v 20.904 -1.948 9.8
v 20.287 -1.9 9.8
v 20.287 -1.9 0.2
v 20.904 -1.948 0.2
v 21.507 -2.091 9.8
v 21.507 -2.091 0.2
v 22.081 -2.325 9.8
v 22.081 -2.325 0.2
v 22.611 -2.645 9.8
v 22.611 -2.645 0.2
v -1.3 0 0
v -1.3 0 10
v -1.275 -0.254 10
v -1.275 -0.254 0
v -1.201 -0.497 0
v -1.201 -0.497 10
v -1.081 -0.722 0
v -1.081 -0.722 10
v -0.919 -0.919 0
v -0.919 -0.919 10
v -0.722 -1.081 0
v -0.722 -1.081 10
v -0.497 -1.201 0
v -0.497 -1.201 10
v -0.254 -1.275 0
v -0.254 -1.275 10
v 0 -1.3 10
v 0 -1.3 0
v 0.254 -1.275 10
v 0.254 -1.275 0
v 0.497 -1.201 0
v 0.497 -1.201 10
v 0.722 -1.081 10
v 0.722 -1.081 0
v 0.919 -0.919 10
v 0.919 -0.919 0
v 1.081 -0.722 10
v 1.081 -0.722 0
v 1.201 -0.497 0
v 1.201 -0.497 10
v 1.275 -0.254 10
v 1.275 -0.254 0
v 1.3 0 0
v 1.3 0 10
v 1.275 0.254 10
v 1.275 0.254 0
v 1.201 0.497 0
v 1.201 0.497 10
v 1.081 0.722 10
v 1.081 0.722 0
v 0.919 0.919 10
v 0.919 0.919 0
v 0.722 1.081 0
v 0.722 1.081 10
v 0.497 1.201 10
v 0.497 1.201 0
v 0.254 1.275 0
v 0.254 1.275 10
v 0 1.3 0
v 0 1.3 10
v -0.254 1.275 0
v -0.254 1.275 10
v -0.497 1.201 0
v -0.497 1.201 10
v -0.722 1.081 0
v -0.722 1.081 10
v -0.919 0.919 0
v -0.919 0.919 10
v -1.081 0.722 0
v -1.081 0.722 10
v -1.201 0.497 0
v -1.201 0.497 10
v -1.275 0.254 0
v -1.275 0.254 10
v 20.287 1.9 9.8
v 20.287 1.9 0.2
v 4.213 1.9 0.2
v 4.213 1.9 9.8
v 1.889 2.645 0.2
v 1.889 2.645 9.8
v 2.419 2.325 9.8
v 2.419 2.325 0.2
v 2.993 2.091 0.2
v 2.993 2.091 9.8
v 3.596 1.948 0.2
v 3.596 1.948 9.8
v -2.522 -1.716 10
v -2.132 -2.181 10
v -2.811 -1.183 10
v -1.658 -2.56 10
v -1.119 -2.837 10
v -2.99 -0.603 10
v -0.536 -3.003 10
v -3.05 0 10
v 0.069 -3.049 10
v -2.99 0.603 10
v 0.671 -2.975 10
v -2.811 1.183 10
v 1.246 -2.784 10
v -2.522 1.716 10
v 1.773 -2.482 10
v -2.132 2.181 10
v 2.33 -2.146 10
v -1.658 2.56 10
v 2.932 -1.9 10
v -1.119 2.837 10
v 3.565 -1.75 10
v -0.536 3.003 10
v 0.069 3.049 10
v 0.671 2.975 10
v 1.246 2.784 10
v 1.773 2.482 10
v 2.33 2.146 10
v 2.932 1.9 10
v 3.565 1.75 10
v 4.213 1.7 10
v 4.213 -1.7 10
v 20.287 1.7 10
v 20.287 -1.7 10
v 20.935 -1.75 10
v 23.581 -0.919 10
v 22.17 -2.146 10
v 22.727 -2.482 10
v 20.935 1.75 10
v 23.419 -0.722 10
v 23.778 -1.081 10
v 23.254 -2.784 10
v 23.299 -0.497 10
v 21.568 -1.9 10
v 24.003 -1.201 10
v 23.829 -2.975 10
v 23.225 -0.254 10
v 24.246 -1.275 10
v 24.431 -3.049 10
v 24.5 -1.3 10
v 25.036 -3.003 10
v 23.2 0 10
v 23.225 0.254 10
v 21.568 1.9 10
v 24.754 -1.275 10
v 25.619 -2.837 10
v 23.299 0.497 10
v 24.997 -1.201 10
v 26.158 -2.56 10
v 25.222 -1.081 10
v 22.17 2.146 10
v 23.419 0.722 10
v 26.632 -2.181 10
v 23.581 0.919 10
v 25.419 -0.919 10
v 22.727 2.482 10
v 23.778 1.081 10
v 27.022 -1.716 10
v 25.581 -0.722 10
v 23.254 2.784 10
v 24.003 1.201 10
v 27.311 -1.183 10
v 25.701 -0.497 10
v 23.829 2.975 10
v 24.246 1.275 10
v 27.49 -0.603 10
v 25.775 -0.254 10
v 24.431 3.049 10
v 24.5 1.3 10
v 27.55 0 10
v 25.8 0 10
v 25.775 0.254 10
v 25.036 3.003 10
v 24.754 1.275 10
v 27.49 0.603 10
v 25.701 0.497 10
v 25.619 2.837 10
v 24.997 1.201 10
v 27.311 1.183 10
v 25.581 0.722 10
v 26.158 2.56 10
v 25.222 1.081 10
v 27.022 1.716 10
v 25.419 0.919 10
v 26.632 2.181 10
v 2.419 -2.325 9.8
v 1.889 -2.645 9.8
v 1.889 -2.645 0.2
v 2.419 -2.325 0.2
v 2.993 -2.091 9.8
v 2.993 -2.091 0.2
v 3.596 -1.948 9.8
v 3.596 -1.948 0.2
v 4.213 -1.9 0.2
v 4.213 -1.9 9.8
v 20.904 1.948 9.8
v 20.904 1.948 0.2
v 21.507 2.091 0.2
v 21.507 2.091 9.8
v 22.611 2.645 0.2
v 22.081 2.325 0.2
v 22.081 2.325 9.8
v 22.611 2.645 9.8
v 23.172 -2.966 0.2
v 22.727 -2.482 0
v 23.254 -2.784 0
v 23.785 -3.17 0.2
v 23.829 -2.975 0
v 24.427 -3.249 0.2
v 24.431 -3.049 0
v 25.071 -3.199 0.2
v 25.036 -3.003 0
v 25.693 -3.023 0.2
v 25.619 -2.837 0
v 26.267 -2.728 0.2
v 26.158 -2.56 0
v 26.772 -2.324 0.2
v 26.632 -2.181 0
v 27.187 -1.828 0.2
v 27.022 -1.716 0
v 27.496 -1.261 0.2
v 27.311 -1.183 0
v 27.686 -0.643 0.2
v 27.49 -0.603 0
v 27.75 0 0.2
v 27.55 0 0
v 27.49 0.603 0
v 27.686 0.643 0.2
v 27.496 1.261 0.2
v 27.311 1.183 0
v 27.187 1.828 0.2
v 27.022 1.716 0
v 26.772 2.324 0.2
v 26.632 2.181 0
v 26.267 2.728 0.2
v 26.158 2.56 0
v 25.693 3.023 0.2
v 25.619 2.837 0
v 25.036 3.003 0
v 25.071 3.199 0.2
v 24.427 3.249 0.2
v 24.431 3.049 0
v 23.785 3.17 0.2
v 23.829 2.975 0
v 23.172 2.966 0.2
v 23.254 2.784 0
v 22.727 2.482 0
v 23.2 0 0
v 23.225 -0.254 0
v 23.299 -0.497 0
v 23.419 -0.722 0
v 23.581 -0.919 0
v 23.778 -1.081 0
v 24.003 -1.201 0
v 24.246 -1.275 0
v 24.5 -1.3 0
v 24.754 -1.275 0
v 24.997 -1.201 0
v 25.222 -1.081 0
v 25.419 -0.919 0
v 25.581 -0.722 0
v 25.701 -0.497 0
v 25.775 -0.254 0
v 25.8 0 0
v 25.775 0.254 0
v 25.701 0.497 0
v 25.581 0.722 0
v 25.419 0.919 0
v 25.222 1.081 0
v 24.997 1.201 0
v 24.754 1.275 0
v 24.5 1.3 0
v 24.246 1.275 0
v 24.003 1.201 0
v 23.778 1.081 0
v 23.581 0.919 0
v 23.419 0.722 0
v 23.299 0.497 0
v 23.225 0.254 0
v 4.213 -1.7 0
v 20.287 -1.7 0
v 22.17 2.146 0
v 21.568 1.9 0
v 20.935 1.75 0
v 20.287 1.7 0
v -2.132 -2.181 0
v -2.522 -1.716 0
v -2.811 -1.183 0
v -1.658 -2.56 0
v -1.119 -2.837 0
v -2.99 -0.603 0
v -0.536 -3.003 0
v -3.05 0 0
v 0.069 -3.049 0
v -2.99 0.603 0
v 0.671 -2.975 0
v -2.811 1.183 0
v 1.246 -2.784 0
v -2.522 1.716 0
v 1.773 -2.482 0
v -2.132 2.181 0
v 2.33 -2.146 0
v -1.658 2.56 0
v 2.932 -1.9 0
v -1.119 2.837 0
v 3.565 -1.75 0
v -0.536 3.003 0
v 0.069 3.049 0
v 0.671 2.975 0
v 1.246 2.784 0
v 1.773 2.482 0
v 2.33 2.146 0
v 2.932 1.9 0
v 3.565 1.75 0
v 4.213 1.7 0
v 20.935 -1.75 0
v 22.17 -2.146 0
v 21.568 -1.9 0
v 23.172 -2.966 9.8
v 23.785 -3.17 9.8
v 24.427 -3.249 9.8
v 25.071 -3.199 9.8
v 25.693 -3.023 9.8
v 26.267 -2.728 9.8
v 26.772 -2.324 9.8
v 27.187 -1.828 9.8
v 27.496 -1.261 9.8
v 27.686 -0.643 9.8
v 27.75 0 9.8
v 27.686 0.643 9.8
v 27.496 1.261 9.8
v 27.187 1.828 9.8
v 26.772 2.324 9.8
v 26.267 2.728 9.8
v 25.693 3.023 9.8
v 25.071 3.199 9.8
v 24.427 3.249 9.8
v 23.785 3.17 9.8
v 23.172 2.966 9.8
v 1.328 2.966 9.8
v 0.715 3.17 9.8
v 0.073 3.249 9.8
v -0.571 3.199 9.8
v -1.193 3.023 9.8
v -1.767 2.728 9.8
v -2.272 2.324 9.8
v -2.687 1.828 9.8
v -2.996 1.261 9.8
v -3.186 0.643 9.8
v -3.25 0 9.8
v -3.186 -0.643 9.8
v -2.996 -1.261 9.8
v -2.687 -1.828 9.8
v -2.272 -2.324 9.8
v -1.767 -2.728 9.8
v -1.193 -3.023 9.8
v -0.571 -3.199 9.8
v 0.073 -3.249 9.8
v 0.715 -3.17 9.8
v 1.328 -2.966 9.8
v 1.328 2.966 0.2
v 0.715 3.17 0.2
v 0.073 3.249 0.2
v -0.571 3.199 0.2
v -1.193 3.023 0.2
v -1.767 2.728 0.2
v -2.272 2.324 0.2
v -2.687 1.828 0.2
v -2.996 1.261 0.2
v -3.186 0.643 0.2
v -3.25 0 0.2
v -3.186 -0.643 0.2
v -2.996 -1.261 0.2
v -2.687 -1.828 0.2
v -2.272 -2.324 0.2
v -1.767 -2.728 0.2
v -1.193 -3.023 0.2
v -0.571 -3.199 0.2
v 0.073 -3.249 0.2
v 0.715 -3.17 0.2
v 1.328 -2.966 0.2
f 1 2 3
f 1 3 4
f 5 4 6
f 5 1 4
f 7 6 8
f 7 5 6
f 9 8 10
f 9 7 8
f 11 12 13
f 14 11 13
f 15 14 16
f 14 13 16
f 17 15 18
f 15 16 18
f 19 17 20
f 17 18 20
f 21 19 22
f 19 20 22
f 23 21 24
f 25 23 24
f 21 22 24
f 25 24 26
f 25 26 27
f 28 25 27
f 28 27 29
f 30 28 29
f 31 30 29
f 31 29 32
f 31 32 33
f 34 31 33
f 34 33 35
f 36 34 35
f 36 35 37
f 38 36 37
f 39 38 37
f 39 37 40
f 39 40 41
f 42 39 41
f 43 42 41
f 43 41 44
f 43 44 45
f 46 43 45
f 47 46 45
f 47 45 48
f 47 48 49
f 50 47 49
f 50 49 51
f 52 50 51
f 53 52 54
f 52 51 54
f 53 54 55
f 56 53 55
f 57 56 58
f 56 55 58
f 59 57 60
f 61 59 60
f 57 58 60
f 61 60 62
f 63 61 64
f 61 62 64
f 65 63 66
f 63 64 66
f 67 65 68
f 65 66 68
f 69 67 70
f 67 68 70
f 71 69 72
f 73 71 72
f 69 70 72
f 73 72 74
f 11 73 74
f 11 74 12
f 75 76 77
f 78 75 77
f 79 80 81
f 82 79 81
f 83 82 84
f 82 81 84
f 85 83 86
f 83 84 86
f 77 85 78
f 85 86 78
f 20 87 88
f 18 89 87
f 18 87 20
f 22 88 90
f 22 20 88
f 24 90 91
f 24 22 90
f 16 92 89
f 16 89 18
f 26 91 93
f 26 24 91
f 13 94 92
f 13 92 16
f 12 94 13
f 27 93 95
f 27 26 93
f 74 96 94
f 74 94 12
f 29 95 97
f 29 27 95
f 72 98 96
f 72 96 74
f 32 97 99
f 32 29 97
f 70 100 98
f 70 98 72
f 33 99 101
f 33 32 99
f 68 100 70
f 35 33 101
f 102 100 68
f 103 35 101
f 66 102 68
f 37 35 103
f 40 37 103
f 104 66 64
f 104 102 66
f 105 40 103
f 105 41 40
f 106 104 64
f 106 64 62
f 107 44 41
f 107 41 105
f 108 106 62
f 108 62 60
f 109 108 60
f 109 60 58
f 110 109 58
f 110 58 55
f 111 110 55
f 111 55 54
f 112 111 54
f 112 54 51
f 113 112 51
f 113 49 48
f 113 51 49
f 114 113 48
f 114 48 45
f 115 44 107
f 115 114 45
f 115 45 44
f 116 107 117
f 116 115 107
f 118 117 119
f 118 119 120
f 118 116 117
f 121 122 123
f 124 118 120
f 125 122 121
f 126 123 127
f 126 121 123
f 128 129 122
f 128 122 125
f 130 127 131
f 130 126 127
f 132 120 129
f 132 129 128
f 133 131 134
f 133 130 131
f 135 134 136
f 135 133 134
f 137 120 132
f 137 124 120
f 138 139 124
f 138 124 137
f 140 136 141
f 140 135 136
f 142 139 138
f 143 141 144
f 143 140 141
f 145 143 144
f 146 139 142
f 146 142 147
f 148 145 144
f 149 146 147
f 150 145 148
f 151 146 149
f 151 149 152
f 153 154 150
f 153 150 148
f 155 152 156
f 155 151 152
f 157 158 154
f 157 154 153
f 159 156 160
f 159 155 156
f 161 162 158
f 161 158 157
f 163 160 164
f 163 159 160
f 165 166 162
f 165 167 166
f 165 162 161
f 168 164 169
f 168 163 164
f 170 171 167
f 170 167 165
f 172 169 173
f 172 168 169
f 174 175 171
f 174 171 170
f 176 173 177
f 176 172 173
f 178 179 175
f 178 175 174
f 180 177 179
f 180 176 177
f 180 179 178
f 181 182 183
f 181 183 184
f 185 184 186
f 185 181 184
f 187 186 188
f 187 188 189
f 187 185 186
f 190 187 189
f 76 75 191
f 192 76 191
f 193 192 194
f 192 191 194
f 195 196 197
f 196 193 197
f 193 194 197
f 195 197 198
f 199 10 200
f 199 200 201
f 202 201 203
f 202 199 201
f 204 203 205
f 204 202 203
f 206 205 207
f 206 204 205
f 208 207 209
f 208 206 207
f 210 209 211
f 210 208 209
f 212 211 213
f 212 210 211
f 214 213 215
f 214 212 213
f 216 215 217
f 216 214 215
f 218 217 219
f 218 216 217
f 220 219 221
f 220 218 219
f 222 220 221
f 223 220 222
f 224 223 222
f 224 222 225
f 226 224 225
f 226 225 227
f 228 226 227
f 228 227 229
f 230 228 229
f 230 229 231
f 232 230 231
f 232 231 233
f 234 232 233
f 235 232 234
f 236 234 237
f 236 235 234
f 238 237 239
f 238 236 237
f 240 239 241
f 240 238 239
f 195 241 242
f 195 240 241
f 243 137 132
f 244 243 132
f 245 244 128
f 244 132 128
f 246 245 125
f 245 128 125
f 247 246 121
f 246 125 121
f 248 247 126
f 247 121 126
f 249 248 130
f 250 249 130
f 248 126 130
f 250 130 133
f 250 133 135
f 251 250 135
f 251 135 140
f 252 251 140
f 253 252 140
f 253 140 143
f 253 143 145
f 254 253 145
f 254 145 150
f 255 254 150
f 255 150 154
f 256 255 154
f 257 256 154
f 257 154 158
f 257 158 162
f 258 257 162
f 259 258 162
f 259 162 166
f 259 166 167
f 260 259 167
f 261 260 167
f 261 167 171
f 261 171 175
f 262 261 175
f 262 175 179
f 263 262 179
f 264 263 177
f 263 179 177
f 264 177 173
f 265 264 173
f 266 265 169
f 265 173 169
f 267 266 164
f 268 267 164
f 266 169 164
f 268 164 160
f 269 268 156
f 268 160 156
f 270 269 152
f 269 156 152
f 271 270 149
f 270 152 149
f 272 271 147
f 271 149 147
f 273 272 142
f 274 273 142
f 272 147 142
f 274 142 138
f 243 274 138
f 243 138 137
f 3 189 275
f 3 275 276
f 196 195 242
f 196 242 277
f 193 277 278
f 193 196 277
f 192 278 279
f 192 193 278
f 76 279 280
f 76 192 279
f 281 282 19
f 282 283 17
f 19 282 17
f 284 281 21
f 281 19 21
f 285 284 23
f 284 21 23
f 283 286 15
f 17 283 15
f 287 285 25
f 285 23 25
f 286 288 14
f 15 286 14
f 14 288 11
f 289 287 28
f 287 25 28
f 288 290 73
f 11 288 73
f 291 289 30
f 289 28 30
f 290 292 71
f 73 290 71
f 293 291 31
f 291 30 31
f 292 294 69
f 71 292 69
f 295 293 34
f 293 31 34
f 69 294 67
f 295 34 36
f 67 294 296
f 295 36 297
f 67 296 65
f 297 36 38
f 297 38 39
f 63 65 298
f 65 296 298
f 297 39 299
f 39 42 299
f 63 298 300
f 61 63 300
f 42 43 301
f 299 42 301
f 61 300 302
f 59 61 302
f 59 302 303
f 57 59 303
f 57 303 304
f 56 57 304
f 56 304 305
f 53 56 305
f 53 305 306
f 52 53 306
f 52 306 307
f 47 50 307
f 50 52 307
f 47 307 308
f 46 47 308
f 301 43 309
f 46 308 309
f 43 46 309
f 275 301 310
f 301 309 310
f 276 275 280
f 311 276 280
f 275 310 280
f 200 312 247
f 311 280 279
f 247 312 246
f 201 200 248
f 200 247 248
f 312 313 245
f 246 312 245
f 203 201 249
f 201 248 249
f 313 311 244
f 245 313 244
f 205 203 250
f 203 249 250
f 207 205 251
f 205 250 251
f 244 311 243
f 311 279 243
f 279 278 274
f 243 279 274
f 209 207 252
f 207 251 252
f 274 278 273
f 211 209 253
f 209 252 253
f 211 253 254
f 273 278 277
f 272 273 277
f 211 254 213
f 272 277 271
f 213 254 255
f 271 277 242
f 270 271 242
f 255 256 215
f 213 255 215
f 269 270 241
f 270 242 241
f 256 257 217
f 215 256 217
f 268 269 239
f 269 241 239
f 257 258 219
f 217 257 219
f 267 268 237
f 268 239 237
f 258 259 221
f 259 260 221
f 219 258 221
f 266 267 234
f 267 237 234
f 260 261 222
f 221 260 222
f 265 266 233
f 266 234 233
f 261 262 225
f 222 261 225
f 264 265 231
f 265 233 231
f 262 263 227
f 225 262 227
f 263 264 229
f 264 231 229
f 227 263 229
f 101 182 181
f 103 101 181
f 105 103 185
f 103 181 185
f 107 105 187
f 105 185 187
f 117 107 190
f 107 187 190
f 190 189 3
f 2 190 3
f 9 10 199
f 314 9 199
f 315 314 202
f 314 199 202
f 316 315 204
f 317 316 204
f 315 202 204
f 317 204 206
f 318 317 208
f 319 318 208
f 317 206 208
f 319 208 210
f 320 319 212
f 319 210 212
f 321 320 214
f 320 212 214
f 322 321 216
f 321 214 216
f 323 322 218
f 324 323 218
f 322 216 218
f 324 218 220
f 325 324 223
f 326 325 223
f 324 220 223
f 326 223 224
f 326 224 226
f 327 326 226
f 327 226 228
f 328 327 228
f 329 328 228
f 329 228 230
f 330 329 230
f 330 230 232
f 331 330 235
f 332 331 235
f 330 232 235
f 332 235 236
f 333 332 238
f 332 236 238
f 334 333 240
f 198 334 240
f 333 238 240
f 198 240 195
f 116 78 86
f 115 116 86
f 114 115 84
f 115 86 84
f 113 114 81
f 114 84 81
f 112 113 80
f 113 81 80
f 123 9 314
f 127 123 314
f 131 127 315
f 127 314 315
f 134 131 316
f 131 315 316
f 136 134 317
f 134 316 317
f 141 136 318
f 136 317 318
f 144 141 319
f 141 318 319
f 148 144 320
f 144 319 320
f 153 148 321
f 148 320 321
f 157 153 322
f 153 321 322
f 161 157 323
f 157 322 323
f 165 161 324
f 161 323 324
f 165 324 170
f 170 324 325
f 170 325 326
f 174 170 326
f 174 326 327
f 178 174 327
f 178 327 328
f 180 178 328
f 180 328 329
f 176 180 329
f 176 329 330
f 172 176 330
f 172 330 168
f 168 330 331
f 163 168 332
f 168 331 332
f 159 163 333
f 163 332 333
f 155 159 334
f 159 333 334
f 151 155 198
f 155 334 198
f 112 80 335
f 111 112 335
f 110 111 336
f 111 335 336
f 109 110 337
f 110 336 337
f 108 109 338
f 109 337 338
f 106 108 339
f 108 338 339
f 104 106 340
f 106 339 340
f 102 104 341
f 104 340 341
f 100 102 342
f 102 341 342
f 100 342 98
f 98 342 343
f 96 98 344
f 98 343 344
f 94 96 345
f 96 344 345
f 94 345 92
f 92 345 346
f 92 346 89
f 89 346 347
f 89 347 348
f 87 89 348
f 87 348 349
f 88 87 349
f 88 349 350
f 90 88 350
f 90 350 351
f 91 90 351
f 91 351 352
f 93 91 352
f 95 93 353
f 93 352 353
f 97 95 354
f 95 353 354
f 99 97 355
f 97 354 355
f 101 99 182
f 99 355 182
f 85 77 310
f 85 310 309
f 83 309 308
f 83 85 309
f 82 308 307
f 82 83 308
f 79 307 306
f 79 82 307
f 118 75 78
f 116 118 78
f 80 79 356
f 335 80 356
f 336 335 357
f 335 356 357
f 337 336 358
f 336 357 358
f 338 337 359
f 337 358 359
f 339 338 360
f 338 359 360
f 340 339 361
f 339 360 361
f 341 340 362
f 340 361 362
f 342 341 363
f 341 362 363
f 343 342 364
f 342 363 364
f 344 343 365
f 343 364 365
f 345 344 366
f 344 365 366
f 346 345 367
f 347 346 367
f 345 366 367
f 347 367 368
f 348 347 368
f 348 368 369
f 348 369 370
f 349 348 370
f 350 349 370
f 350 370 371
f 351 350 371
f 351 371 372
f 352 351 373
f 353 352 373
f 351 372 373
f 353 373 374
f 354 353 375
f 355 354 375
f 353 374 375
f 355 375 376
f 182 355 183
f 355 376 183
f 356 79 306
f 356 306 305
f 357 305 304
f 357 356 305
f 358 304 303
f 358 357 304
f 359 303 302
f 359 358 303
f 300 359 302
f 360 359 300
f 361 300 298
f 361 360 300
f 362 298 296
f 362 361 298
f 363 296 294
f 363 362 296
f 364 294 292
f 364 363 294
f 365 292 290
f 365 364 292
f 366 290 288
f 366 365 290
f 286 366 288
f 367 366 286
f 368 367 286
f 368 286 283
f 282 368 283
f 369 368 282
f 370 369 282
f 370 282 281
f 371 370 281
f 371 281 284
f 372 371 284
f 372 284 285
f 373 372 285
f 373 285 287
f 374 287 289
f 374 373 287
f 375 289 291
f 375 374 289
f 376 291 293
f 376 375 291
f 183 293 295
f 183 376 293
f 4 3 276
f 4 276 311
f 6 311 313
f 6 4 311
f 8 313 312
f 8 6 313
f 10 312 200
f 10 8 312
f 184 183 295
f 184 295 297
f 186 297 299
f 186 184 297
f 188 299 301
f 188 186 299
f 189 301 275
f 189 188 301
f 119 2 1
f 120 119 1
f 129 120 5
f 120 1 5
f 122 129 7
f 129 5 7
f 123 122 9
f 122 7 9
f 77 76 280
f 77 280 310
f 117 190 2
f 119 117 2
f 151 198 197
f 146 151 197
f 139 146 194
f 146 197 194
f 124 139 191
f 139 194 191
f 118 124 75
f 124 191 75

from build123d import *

# Parameters (mm, degrees)
F1_DEPTH = 10
F2_D     = 2.6
F3_R     = 4
F4_SIZE  = 0.2


with BuildPart() as f1:
    # F0 (on Top) → F1 (new body)
    with BuildSketch(Plane.XY):
        with BuildLine():
            ThreePointArc((2.636759, 1.9), (-3.25, 0), (2.636759, -1.9))
            Line((2.636759, -1.9), (21.863241, -1.9))
            ThreePointArc((21.863241, -1.9), (27.75, 0), (21.863241, 1.9))
            Line((21.863241, 1.9), (2.636759, 1.9))
        make_face()
    extrude(amount=F1_DEPTH)

    # F2 (through all)
    with Locations(Plane(origin=(0, 0, 0), x_dir=(1, 0, 0), z_dir=(0, 0, -1))):
        with Locations((0, 0), (24.5, 0)):
            Hole(F2_D / 2)

    # F3
    f3_edges = [f1.edges().sort_by_distance(p)[0] for p in [
        (2.636759, -1.9, 5),
        (21.863241, -1.9, 5),
        (2.636759, 1.9, 5),
        (21.863241, 1.9, 5),
    ]]
    fillet(f3_edges, radius=F3_R)

    # F4
    f4_edges = [f1.edges().sort_by_distance(p)[0] for p in [
        (12.25, 1.9, 0),
        (12.25, 1.9, 10),
    ]]
    chamfer(f4_edges, length=F4_SIZE)


solid = f1.part
